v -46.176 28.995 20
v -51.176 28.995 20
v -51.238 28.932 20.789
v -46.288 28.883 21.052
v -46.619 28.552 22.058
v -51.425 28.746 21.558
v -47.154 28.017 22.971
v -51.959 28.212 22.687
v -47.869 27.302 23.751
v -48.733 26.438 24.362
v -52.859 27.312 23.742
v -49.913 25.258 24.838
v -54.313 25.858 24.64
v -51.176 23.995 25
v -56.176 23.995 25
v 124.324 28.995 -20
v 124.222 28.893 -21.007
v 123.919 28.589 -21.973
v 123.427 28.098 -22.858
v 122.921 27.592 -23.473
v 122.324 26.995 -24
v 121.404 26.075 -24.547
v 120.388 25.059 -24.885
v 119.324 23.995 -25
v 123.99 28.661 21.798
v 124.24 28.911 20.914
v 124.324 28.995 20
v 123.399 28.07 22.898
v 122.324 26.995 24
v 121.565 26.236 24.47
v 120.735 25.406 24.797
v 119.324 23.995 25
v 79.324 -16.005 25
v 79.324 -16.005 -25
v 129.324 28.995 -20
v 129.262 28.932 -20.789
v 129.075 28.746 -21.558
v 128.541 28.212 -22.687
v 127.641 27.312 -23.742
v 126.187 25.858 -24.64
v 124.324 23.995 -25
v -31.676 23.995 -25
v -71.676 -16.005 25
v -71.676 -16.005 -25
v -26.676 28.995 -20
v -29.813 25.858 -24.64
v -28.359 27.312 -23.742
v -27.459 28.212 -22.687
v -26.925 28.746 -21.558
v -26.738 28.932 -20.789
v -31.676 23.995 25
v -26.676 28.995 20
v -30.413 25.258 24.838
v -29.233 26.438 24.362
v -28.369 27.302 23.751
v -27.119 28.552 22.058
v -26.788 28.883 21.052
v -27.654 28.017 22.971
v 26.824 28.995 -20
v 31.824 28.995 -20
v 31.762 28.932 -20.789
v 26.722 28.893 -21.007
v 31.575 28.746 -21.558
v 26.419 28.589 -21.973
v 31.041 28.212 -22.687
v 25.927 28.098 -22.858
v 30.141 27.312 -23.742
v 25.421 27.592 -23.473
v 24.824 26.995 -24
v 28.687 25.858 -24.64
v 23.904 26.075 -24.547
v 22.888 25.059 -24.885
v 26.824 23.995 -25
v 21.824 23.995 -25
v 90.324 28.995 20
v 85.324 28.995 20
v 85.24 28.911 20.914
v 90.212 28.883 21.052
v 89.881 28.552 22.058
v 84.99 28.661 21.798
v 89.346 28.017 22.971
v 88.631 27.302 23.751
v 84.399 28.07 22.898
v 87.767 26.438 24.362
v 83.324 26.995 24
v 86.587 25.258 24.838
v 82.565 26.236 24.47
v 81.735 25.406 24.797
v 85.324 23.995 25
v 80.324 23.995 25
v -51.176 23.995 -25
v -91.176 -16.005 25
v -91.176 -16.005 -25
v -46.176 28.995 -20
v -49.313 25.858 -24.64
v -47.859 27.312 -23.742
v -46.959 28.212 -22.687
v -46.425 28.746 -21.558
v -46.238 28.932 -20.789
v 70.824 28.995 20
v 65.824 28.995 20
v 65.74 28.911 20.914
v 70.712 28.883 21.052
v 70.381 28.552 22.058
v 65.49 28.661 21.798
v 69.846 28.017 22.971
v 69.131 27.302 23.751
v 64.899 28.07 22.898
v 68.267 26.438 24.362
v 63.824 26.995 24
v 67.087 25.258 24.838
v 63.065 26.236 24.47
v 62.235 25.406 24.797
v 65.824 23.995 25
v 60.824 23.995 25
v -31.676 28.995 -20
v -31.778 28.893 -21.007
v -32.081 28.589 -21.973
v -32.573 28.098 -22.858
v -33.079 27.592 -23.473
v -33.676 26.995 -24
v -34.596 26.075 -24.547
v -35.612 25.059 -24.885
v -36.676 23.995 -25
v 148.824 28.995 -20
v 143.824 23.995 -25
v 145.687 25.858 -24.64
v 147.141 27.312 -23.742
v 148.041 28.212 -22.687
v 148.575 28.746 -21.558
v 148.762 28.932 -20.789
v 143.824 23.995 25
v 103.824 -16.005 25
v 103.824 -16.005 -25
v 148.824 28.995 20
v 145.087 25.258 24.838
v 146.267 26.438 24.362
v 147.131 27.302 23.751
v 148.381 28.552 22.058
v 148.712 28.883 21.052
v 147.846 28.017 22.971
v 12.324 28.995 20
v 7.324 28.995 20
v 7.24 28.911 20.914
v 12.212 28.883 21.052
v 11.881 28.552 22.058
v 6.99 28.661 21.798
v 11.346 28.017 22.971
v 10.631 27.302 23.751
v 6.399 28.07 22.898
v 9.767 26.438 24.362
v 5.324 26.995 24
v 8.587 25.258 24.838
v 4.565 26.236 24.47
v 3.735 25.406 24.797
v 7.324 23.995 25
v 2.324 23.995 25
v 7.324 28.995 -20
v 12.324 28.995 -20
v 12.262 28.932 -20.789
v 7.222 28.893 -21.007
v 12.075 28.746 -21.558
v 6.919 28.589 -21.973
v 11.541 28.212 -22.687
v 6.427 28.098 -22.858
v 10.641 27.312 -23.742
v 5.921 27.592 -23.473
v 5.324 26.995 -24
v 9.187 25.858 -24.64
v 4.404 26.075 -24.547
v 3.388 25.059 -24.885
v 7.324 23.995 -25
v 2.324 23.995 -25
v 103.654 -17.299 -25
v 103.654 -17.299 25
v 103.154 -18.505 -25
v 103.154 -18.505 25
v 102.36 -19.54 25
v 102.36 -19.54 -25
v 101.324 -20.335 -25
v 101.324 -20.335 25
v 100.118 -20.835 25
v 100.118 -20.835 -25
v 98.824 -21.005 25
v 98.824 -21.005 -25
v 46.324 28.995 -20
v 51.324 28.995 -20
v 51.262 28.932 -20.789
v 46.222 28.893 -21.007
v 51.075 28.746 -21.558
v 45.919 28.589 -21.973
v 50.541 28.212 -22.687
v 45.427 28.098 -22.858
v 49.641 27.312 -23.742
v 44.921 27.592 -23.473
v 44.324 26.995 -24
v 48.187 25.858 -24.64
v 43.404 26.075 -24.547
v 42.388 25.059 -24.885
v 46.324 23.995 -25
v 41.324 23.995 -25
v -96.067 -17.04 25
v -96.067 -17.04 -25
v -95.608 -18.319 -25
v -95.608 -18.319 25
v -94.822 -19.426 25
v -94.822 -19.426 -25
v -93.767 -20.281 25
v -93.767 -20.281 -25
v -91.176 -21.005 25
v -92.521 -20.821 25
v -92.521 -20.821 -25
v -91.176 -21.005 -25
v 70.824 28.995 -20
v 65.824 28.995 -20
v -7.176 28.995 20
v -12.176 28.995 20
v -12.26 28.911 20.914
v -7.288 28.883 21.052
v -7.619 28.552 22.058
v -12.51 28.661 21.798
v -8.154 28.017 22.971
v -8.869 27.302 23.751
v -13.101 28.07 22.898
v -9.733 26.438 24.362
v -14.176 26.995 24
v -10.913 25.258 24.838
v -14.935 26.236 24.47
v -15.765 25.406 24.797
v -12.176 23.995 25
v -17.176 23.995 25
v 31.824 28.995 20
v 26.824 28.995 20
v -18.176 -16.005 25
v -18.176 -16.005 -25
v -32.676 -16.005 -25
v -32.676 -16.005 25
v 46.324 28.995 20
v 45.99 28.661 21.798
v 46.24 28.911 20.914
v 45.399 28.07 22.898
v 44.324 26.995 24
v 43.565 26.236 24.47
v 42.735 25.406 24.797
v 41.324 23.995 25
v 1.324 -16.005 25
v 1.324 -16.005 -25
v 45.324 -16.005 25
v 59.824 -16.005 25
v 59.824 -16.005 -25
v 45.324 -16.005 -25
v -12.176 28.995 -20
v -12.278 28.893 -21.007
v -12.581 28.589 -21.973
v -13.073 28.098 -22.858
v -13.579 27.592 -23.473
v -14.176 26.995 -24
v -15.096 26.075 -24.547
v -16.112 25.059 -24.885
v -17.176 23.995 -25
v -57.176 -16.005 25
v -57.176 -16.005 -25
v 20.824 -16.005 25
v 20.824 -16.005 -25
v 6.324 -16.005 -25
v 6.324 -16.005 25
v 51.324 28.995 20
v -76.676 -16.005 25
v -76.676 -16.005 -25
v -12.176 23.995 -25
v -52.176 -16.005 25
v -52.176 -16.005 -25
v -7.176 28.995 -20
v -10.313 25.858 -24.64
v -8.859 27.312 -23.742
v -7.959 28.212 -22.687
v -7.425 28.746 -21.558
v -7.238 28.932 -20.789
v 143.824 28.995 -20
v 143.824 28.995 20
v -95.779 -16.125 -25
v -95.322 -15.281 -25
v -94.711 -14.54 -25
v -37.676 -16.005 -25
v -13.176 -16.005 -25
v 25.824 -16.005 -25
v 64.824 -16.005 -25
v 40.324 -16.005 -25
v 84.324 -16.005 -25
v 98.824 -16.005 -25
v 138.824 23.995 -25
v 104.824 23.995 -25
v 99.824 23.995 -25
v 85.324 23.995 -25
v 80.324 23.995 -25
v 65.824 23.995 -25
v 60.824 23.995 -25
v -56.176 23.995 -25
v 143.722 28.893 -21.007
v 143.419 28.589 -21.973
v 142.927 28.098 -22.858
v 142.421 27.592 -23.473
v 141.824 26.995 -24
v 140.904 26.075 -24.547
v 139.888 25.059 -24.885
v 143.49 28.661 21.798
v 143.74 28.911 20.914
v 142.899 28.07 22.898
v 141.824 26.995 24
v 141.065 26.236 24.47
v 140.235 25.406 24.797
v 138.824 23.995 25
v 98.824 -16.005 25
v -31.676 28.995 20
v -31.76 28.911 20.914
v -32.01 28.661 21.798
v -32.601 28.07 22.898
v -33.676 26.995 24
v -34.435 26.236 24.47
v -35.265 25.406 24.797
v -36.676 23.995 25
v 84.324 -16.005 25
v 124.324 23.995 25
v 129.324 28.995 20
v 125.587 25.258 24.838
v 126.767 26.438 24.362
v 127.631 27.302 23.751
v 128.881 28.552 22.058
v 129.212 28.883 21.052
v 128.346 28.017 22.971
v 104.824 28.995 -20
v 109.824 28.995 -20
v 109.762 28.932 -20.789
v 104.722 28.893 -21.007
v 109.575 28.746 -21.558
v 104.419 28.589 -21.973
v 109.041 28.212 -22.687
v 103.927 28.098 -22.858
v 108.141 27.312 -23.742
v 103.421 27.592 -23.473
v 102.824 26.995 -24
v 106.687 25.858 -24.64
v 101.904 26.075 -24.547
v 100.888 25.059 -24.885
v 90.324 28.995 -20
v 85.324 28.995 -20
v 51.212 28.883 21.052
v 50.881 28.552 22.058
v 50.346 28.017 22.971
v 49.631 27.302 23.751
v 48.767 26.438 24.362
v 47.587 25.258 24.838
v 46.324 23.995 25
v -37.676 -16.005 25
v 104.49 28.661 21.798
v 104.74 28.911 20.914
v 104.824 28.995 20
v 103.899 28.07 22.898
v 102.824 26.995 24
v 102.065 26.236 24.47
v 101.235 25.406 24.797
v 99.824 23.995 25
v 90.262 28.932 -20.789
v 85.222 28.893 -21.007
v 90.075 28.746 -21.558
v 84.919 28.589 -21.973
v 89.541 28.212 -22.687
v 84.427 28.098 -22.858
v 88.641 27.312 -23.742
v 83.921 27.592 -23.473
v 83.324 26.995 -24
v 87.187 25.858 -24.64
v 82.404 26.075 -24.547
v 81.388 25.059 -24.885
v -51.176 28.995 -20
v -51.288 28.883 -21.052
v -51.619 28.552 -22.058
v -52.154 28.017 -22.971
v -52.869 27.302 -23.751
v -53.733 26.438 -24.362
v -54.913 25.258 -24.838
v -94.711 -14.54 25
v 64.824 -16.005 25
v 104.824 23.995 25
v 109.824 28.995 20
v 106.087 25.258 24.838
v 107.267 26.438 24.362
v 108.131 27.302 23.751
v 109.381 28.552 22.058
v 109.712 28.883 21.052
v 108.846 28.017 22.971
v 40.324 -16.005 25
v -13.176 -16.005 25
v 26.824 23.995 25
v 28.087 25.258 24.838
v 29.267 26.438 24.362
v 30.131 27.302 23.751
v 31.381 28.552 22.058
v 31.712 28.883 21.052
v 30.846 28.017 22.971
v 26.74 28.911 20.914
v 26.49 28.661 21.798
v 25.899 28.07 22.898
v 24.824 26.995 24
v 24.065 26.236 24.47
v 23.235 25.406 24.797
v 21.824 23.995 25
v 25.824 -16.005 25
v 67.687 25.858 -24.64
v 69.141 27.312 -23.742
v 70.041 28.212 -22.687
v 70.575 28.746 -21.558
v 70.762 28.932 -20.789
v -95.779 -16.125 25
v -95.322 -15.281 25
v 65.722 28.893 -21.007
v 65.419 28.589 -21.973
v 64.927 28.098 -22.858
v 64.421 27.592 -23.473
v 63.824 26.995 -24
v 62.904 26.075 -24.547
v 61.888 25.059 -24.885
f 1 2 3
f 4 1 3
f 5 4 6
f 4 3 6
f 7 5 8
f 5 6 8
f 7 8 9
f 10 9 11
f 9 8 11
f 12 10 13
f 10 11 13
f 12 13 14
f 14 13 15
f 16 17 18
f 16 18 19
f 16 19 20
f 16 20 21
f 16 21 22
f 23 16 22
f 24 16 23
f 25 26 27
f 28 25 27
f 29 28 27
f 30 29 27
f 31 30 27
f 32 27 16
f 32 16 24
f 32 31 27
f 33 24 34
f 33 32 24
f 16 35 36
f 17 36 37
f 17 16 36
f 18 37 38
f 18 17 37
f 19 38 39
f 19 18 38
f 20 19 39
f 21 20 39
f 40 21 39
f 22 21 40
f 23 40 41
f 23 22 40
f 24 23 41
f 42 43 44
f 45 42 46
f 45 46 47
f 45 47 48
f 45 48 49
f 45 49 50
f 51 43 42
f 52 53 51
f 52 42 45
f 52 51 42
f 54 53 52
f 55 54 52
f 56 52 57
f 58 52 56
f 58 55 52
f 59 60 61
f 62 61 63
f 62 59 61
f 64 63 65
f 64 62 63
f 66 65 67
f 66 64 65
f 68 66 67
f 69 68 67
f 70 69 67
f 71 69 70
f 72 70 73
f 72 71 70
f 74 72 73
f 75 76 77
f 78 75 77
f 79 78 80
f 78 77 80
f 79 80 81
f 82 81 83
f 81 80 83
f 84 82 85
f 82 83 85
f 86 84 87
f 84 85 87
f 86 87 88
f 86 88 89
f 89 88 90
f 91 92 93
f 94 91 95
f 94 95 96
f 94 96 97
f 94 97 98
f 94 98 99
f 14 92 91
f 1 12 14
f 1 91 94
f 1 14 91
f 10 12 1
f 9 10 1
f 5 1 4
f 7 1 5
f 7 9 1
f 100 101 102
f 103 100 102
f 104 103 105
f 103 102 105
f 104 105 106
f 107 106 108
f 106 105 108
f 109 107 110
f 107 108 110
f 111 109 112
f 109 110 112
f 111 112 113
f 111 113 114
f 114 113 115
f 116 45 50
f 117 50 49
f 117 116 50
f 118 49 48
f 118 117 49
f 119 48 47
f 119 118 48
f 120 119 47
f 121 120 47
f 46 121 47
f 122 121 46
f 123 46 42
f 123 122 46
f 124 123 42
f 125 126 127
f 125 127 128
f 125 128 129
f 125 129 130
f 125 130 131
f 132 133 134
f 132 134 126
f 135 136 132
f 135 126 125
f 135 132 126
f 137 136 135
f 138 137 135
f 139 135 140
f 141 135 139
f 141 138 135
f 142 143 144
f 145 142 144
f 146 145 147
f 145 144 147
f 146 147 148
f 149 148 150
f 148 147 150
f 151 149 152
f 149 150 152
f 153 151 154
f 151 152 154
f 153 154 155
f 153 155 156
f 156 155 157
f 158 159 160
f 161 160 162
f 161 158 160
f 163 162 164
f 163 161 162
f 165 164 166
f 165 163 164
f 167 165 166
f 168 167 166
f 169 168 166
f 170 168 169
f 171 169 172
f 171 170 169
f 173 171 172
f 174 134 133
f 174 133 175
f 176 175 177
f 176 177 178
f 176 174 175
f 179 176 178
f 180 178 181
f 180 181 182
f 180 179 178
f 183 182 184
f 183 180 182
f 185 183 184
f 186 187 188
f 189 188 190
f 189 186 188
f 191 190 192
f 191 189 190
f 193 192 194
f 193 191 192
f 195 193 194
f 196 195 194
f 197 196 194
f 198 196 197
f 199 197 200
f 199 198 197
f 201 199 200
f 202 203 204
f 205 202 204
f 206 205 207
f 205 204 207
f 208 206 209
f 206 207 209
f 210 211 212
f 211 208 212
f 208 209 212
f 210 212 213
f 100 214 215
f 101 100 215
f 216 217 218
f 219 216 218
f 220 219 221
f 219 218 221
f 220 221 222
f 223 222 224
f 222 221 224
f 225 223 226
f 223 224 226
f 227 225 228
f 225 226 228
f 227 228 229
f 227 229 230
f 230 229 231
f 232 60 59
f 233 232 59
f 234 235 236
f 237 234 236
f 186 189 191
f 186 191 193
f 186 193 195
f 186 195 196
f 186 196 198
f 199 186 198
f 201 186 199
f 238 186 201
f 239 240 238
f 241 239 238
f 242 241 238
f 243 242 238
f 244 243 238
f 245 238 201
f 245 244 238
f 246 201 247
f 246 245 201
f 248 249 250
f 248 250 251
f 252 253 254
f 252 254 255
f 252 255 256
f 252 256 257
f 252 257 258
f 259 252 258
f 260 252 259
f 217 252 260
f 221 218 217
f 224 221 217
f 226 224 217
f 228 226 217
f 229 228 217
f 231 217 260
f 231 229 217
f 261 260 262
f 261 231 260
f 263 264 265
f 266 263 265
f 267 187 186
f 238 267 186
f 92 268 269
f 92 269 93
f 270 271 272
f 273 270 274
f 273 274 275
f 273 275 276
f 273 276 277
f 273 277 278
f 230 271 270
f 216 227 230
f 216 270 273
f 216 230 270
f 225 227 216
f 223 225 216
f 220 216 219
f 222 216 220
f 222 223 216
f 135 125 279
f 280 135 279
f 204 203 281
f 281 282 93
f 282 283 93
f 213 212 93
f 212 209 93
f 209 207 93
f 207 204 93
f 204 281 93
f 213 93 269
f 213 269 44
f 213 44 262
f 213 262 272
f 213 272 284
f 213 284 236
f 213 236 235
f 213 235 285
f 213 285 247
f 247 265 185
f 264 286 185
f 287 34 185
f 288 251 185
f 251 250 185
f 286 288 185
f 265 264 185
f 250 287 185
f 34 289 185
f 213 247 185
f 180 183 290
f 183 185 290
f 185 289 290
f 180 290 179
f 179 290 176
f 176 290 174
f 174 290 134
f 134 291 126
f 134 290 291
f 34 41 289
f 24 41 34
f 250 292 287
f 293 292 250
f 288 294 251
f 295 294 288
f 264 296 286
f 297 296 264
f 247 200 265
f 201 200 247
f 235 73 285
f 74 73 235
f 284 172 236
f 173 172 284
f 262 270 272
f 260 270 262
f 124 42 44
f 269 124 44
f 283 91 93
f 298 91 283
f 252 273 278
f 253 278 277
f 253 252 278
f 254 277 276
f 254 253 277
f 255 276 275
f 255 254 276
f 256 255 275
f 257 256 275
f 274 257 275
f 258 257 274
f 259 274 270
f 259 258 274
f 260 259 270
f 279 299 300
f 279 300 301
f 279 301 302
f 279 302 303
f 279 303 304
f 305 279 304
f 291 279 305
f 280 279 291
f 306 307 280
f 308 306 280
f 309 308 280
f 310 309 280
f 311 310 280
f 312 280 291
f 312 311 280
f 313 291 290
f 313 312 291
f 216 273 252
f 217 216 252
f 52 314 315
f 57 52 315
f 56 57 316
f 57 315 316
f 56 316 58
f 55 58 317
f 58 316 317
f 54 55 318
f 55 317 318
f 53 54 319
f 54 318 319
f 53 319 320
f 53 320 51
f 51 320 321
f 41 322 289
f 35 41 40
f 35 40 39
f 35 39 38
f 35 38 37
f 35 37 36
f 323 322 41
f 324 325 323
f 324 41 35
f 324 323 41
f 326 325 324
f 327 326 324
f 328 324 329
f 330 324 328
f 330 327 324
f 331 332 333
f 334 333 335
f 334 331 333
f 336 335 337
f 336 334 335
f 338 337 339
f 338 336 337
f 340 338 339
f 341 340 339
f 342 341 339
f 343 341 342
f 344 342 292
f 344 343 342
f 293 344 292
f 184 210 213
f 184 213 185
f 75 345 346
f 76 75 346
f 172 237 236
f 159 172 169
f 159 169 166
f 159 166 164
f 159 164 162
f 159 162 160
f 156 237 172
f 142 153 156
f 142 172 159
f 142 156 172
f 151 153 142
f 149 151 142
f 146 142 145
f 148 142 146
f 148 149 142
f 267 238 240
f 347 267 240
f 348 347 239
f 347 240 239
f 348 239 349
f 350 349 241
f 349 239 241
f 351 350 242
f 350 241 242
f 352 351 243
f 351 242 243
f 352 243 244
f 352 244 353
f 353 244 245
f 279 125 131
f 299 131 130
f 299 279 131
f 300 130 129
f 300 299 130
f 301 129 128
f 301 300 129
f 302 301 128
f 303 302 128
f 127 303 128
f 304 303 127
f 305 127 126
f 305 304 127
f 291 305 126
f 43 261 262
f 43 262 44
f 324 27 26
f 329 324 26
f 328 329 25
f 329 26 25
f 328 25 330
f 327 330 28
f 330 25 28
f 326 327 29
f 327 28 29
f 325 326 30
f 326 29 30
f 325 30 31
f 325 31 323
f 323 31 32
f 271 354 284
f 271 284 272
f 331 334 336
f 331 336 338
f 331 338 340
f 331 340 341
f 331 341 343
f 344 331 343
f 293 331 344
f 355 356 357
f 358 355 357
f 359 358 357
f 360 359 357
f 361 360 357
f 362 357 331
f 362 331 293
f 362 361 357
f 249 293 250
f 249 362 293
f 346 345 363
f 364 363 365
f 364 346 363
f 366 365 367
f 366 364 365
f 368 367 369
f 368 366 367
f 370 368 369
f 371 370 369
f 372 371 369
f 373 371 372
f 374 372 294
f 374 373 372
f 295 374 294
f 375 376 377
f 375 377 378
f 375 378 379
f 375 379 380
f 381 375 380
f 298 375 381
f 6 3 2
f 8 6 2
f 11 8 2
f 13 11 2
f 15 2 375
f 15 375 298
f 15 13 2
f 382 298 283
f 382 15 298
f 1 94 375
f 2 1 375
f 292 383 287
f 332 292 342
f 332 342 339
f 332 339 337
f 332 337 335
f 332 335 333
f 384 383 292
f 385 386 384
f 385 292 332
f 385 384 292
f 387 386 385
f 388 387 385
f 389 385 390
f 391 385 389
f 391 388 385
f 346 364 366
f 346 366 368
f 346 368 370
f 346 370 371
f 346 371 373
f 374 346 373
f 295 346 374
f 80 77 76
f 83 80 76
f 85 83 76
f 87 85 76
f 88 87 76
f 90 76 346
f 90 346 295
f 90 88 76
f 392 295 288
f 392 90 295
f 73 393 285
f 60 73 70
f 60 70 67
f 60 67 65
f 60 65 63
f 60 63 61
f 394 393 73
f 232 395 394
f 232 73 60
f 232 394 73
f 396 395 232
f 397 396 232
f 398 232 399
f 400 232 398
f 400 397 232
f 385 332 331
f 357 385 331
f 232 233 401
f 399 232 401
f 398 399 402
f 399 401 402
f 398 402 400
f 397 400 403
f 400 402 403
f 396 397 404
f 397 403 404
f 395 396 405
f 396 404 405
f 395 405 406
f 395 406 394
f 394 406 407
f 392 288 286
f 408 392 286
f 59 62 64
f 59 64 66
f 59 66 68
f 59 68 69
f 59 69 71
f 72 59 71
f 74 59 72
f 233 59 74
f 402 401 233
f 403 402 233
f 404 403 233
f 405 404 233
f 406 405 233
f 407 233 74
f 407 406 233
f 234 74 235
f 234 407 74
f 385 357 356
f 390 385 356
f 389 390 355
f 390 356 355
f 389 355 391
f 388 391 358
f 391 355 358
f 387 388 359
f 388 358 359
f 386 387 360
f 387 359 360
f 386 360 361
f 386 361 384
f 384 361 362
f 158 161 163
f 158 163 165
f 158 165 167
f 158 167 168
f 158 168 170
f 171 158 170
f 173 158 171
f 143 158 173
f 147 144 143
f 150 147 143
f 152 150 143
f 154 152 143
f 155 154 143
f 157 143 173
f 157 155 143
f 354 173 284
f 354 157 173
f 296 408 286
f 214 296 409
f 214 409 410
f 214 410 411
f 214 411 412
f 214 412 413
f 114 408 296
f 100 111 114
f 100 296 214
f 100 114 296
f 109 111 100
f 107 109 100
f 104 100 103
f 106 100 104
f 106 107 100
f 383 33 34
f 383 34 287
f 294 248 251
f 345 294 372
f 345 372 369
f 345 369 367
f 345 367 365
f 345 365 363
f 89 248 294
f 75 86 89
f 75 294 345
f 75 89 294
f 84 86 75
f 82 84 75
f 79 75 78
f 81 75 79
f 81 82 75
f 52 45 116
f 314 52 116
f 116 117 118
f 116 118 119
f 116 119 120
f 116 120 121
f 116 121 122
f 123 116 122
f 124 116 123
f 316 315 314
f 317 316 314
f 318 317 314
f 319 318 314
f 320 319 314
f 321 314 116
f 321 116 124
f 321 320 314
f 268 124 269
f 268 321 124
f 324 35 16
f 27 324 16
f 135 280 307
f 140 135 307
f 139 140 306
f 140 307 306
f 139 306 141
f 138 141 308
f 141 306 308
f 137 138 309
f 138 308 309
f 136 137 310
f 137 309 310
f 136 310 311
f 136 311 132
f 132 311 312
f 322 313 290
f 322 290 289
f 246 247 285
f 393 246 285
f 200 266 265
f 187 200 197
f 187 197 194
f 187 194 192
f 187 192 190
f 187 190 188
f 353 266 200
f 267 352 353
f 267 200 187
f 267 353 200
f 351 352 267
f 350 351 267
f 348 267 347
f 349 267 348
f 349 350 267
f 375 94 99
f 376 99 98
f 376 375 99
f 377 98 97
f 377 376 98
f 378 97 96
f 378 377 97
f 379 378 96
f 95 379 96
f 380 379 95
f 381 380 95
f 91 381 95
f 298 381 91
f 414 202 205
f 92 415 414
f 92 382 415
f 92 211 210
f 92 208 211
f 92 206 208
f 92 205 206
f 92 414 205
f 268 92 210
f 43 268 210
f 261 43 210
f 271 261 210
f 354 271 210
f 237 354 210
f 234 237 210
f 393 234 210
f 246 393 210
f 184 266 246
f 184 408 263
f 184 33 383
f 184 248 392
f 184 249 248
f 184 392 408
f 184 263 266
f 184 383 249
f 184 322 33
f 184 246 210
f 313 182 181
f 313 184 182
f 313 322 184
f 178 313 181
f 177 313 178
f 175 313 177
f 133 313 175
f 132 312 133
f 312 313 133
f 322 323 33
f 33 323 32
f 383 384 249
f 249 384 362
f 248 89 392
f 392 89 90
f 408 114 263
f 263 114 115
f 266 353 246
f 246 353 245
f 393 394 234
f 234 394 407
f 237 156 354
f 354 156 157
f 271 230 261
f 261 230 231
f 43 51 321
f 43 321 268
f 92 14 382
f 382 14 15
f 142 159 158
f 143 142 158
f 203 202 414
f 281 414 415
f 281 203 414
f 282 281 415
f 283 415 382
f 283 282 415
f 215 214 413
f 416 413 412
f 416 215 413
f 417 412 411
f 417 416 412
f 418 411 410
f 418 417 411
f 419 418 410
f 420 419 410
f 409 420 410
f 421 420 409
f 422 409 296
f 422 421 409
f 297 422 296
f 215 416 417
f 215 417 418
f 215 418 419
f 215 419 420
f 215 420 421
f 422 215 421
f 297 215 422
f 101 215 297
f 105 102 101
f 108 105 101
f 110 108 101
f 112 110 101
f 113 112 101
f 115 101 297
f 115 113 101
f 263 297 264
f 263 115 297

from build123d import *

# Parameters (mm, degrees)
F1_DEPTH     = 25
F2_T1_DEPTH  = 30
F2_T3_DEPTH  = 30
F2_T5_DEPTH  = 30
F2_T7_DEPTH  = 30
F2_T9_DEPTH  = 30
F2_T11_DEPTH = 30
F2_T13_DEPTH = 30
F2_T15_DEPTH = 30
F2_T17_DEPTH = 30
F2_T19_DEPTH = 30
F2_T21_DEPTH = 30
F2_T23_DEPTH = 60.3553390593
F2_T25_DEPTH = 75


# Not quite as in the source:
# - a fillet or chamfer that OpenCascade refuses, or shapes differently, is made with other operations: its cross-section is extruded or revolved along the edge and cut away or added


with BuildPart() as f1:
    # F0 (on Top) → F1 (new body, symmetric)
    with BuildSketch(Plane.XY):
        Polygon((-96.1758106947, -16.0049479455), (-96.1758106947, -21.0049479455), (103.8241893053, -21.0049479455), (103.8241893053, -16.0049479455), (98.8241893053, -16.0049479455), (84.3241893053, -16.0049479455), (79.3241893053, -16.0049479455), (64.8241893053, -16.0049479455), (59.8241893053, -16.0049479455), (45.3241893053, -16.0049479455), (40.3241893053, -16.0049479455), (25.8241893053, -16.0049479455), (20.8241893053, -16.0049479455), (6.3241893053, -16.0049479455), (1.3241893053, -16.0049479455), (-13.1758106947, -16.0049479455), (-18.1758106947, -16.0049479455), (-32.6758106947, -16.0049479455), (-37.6758106947, -16.0049479455), (-52.1758106947, -16.0049479455), (-57.1758106947, -16.0049479455), (-71.6758106947, -16.0049479455), (-76.6758106947, -16.0049479455), (-91.1758106947, -16.0049479455), align=None)
        Polygon((-51.1758106947, 28.9950520545), (-96.1758106947, -16.0049479455), (-91.1758106947, -16.0049479455), (-46.1758106947, 28.9950520545), align=None)
        Polygon((98.8241893053, -16.0049479455), (103.8241893053, -16.0049479455), (148.8241893053, 28.9950520545), (143.8241893053, 28.9950520545), align=None)
        Polygon((-31.6758106947, 28.9950520545), (-76.6758106947, -16.0049479455), (-71.6758106947, -16.0049479455), (-26.6758106947, 28.9950520545), align=None)
        Polygon((79.3241893053, -16.0049479455), (84.3241893053, -16.0049479455), (129.3241893053, 28.9950520545), (124.3241893053, 28.9950520545), align=None)
        Polygon((-12.1758106947, 28.9950520545), (-57.1758106947, -16.0049479455), (-52.1758106947, -16.0049479455), (-7.1758106947, 28.9950520545), align=None)
        Polygon((59.8241893053, -16.0049479455), (64.8241893053, -16.0049479455), (109.8241893053, 28.9950520545), (104.8241893053, 28.9950520545), align=None)
        Polygon((7.3241893053, 28.9950520545), (-37.6758106947, -16.0049479455), (-32.6758106947, -16.0049479455), (12.3241893053, 28.9950520545), align=None)
        Polygon((40.3241893053, -16.0049479455), (45.3241893053, -16.0049479455), (90.3241893053, 28.9950520545), (85.3241893053, 28.9950520545), align=None)
        Polygon((26.8241893053, 28.9950520545), (-18.1758106947, -16.0049479455), (-13.1758106947, -16.0049479455), (31.8241893053, 28.9950520545), align=None)
        Polygon((20.8241893053, -16.0049479455), (25.8241893053, -16.0049479455), (70.8241893053, 28.9950520545), (65.8241893053, 28.9950520545), align=None)
        Polygon((46.3241893053, 28.9950520545), (1.3241893053, -16.0049479455), (6.3241893053, -16.0049479455), (51.3241893053, 28.9950520545), align=None)
    extrude(amount=F1_DEPTH, both=True)

    # F2: fillet of radius 5 on 25 edges, made by hand

    # F2_s2 → F2_t1 (cut)
    with BuildSketch(Plane.YZ.offset(-63.6758106947)):
        with BuildLine():
            ThreePointArc((28.9950520545, 20), (27.5305859605, 23.5355339059), (23.9950520545, 25))
            Line((23.9950520545, 25), (28.9950520545, 25))
            Line((28.9950520545, 25), (28.9950520545, 20))
        make_face()
        with BuildLine():
            ThreePointArc((28.9950520545, -20), (27.5305859605, -23.5355339059), (23.9950520545, -25))
            Line((23.9950520545, -25), (28.9950520545, -25))
            Line((28.9950520545, -25), (28.9950520545, -20))
        make_face()
    extrude(amount=F2_T1_DEPTH, mode=Mode.SUBTRACT)

    # F2_s4 → F2_t3 (cut)
    with BuildSketch(Plane.YZ.offset(-44.1758106947)):
        with BuildLine():
            ThreePointArc((28.9950520545, 20), (27.5305859605, 23.5355339059), (23.9950520545, 25))
            Line((23.9950520545, 25), (28.9950520545, 25))
            Line((28.9950520545, 25), (28.9950520545, 20))
        make_face()
        with BuildLine():
            ThreePointArc((28.9950520545, -20), (27.5305859605, -23.5355339059), (23.9950520545, -25))
            Line((23.9950520545, -25), (28.9950520545, -25))
            Line((28.9950520545, -25), (28.9950520545, -20))
        make_face()
    extrude(amount=F2_T3_DEPTH, mode=Mode.SUBTRACT)

    # F2_s6 → F2_t5 (cut)
    with BuildSketch(Plane.YZ.offset(-24.6758106947)):
        with BuildLine():
            ThreePointArc((28.9950520545, 20), (27.5305859604, 23.5355339059), (23.9950520545, 25))
            Line((23.9950520545, 25), (28.9950520545, 25))
            Line((28.9950520545, 25), (28.9950520545, 20))
        make_face()
        with BuildLine():
            ThreePointArc((28.9950520545, -20), (27.5305859604, -23.5355339059), (23.9950520545, -25))
            Line((23.9950520545, -25), (28.9950520545, -25))
            Line((28.9950520545, -25), (28.9950520545, -20))
        make_face()
    extrude(amount=F2_T5_DEPTH, mode=Mode.SUBTRACT)

    # F2_s8 → F2_t7 (cut)
    with BuildSketch(Plane.YZ.offset(-5.1758106947)):
        with BuildLine():
            ThreePointArc((28.9950520545, 20), (27.5305859604, 23.5355339059), (23.9950520545, 25))
            Line((23.9950520545, 25), (28.9950520545, 25))
            Line((28.9950520545, 25), (28.9950520545, 20))
        make_face()
        with BuildLine():
            ThreePointArc((28.9950520545, -20), (27.5305859604, -23.5355339059), (23.9950520545, -25))
            Line((23.9950520545, -25), (28.9950520545, -25))
            Line((28.9950520545, -25), (28.9950520545, -20))
        make_face()
    extrude(amount=F2_T7_DEPTH, mode=Mode.SUBTRACT)

    # F2_s10 → F2_t9 (cut)
    with BuildSketch(Plane.YZ.offset(14.3241893053)):
        with BuildLine():
            ThreePointArc((28.9950520545, 20), (27.5305859605, 23.5355339059), (23.9950520545, 25))
            Line((23.9950520545, 25), (28.9950520545, 25))
            Line((28.9950520545, 25), (28.9950520545, 20))
        make_face()
        with BuildLine():
            ThreePointArc((28.9950520545, -20), (27.5305859605, -23.5355339059), (23.9950520545, -25))
            Line((23.9950520545, -25), (28.9950520545, -25))
            Line((28.9950520545, -25), (28.9950520545, -20))
        make_face()
    extrude(amount=F2_T9_DEPTH, mode=Mode.SUBTRACT)

    # F2_s12 → F2_t11 (cut)
    with BuildSketch(Plane.YZ.offset(33.8241893053)):
        with BuildLine():
            ThreePointArc((28.9950520545, 20), (27.5305859605, 23.5355339059), (23.9950520545, 25))
            Line((23.9950520545, 25), (28.9950520545, 25))
            Line((28.9950520545, 25), (28.9950520545, 20))
        make_face()
        with BuildLine():
            ThreePointArc((28.9950520545, -20), (27.5305859605, -23.5355339059), (23.9950520545, -25))
            Line((23.9950520545, -25), (28.9950520545, -25))
            Line((28.9950520545, -25), (28.9950520545, -20))
        make_face()
    extrude(amount=F2_T11_DEPTH, mode=Mode.SUBTRACT)

    # F2_s14 → F2_t13 (cut)
    with BuildSketch(Plane.YZ.offset(53.3241893053)):
        with BuildLine():
            ThreePointArc((28.9950520545, 20), (27.5305859605, 23.5355339059), (23.9950520545, 25))
            Line((23.9950520545, 25), (28.9950520545, 25))
            Line((28.9950520545, 25), (28.9950520545, 20))
        make_face()
        with BuildLine():
            ThreePointArc((28.9950520545, -20), (27.5305859605, -23.5355339059), (23.9950520545, -25))
            Line((23.9950520545, -25), (28.9950520545, -25))
            Line((28.9950520545, -25), (28.9950520545, -20))
        make_face()
    extrude(amount=F2_T13_DEPTH, mode=Mode.SUBTRACT)

    # F2_s16 → F2_t15 (cut)
    with BuildSketch(Plane.YZ.offset(72.8241893053)):
        with BuildLine():
            ThreePointArc((28.9950520545, 20), (27.5305859605, 23.5355339059), (23.9950520545, 25))
            Line((23.9950520545, 25), (28.9950520545, 25))
            Line((28.9950520545, 25), (28.9950520545, 20))
        make_face()
        with BuildLine():
            ThreePointArc((28.9950520545, -20), (27.5305859605, -23.5355339059), (23.9950520545, -25))
            Line((23.9950520545, -25), (28.9950520545, -25))
            Line((28.9950520545, -25), (28.9950520545, -20))
        make_face()
    extrude(amount=F2_T15_DEPTH, mode=Mode.SUBTRACT)

    # F2_s18 → F2_t17 (cut)
    with BuildSketch(Plane.YZ.offset(92.3241893053)):
        with BuildLine():
            ThreePointArc((28.9950520545, 20), (27.5305859605, 23.5355339059), (23.9950520545, 25))
            Line((23.9950520545, 25), (28.9950520545, 25))
            Line((28.9950520545, 25), (28.9950520545, 20))
        make_face()
        with BuildLine():
            ThreePointArc((28.9950520545, -20), (27.5305859605, -23.5355339059), (23.9950520545, -25))
            Line((23.9950520545, -25), (28.9950520545, -25))
            Line((28.9950520545, -25), (28.9950520545, -20))
        make_face()
    extrude(amount=F2_T17_DEPTH, mode=Mode.SUBTRACT)

    # F2_s20 → F2_t19 (cut)
    with BuildSketch(Plane.YZ.offset(111.8241893053)):
        with BuildLine():
            ThreePointArc((28.9950520545, 20), (27.5305859605, 23.5355339059), (23.9950520545, 25))
            Line((23.9950520545, 25), (28.9950520545, 25))
            Line((28.9950520545, 25), (28.9950520545, 20))
        make_face()
        with BuildLine():
            ThreePointArc((28.9950520545, -20), (27.5305859605, -23.5355339059), (23.9950520545, -25))
            Line((23.9950520545, -25), (28.9950520545, -25))
            Line((28.9950520545, -25), (28.9950520545, -20))
        make_face()
    extrude(amount=F2_T19_DEPTH, mode=Mode.SUBTRACT)

    # F2_s22 → F2_t21 (cut)
    with BuildSketch(Plane.YZ.offset(131.3241893053)):
        with BuildLine():
            ThreePointArc((28.9950520545, 20), (27.5305859605, 23.5355339059), (23.9950520545, 25))
            Line((23.9950520545, 25), (28.9950520545, 25))
            Line((28.9950520545, 25), (28.9950520545, 20))
        make_face()
        with BuildLine():
            ThreePointArc((28.9950520545, -20), (27.5305859605, -23.5355339059), (23.9950520545, -25))
            Line((23.9950520545, -25), (28.9950520545, -25))
            Line((28.9950520545, -25), (28.9950520545, -20))
        make_face()
    extrude(amount=F2_T21_DEPTH, mode=Mode.SUBTRACT)

    # F2_s24 → F2_t23 (cut)
    with BuildSketch(Plane.XY.offset(-30.1776695297)):
        with BuildLine():
            ThreePointArc((-96.1758106947, -18.0760157573), (-95.7952083573, -16.1625985955), (-94.7113446006, -14.5404818514))
            Line((-94.7113446006, -14.5404818514), (-96.1758106947, -16.0049479455))
            Line((-96.1758106947, -16.0049479455), (-96.1758106947, -18.0760157573))
        make_face()
    extrude(amount=F2_T23_DEPTH, mode=Mode.SUBTRACT)

    # F2_s26 → F2_t25 (cut)
    with BuildSketch(Plane.XY.offset(-37.5)):
        with BuildLine():
            ThreePointArc((-96.1758106947, -16.0049479455), (-94.7113446006, -19.5404818514), (-91.1758106947, -21.0049479455))
            Line((-91.1758106947, -21.0049479455), (-96.1758106947, -21.0049479455))
            Line((-96.1758106947, -21.0049479455), (-96.1758106947, -16.0049479455))
        make_face()
        with BuildLine():
            ThreePointArc((103.8241893053, -16.0049479455), (102.3597232112, -19.5404818514), (98.8241893053, -21.0049479455))
            Line((98.8241893053, -21.0049479455), (103.8241893053, -21.0049479455))
            Line((103.8241893053, -21.0049479455), (103.8241893053, -16.0049479455))
        make_face()
    extrude(amount=F2_T25_DEPTH, mode=Mode.SUBTRACT)


solid = f1.part
